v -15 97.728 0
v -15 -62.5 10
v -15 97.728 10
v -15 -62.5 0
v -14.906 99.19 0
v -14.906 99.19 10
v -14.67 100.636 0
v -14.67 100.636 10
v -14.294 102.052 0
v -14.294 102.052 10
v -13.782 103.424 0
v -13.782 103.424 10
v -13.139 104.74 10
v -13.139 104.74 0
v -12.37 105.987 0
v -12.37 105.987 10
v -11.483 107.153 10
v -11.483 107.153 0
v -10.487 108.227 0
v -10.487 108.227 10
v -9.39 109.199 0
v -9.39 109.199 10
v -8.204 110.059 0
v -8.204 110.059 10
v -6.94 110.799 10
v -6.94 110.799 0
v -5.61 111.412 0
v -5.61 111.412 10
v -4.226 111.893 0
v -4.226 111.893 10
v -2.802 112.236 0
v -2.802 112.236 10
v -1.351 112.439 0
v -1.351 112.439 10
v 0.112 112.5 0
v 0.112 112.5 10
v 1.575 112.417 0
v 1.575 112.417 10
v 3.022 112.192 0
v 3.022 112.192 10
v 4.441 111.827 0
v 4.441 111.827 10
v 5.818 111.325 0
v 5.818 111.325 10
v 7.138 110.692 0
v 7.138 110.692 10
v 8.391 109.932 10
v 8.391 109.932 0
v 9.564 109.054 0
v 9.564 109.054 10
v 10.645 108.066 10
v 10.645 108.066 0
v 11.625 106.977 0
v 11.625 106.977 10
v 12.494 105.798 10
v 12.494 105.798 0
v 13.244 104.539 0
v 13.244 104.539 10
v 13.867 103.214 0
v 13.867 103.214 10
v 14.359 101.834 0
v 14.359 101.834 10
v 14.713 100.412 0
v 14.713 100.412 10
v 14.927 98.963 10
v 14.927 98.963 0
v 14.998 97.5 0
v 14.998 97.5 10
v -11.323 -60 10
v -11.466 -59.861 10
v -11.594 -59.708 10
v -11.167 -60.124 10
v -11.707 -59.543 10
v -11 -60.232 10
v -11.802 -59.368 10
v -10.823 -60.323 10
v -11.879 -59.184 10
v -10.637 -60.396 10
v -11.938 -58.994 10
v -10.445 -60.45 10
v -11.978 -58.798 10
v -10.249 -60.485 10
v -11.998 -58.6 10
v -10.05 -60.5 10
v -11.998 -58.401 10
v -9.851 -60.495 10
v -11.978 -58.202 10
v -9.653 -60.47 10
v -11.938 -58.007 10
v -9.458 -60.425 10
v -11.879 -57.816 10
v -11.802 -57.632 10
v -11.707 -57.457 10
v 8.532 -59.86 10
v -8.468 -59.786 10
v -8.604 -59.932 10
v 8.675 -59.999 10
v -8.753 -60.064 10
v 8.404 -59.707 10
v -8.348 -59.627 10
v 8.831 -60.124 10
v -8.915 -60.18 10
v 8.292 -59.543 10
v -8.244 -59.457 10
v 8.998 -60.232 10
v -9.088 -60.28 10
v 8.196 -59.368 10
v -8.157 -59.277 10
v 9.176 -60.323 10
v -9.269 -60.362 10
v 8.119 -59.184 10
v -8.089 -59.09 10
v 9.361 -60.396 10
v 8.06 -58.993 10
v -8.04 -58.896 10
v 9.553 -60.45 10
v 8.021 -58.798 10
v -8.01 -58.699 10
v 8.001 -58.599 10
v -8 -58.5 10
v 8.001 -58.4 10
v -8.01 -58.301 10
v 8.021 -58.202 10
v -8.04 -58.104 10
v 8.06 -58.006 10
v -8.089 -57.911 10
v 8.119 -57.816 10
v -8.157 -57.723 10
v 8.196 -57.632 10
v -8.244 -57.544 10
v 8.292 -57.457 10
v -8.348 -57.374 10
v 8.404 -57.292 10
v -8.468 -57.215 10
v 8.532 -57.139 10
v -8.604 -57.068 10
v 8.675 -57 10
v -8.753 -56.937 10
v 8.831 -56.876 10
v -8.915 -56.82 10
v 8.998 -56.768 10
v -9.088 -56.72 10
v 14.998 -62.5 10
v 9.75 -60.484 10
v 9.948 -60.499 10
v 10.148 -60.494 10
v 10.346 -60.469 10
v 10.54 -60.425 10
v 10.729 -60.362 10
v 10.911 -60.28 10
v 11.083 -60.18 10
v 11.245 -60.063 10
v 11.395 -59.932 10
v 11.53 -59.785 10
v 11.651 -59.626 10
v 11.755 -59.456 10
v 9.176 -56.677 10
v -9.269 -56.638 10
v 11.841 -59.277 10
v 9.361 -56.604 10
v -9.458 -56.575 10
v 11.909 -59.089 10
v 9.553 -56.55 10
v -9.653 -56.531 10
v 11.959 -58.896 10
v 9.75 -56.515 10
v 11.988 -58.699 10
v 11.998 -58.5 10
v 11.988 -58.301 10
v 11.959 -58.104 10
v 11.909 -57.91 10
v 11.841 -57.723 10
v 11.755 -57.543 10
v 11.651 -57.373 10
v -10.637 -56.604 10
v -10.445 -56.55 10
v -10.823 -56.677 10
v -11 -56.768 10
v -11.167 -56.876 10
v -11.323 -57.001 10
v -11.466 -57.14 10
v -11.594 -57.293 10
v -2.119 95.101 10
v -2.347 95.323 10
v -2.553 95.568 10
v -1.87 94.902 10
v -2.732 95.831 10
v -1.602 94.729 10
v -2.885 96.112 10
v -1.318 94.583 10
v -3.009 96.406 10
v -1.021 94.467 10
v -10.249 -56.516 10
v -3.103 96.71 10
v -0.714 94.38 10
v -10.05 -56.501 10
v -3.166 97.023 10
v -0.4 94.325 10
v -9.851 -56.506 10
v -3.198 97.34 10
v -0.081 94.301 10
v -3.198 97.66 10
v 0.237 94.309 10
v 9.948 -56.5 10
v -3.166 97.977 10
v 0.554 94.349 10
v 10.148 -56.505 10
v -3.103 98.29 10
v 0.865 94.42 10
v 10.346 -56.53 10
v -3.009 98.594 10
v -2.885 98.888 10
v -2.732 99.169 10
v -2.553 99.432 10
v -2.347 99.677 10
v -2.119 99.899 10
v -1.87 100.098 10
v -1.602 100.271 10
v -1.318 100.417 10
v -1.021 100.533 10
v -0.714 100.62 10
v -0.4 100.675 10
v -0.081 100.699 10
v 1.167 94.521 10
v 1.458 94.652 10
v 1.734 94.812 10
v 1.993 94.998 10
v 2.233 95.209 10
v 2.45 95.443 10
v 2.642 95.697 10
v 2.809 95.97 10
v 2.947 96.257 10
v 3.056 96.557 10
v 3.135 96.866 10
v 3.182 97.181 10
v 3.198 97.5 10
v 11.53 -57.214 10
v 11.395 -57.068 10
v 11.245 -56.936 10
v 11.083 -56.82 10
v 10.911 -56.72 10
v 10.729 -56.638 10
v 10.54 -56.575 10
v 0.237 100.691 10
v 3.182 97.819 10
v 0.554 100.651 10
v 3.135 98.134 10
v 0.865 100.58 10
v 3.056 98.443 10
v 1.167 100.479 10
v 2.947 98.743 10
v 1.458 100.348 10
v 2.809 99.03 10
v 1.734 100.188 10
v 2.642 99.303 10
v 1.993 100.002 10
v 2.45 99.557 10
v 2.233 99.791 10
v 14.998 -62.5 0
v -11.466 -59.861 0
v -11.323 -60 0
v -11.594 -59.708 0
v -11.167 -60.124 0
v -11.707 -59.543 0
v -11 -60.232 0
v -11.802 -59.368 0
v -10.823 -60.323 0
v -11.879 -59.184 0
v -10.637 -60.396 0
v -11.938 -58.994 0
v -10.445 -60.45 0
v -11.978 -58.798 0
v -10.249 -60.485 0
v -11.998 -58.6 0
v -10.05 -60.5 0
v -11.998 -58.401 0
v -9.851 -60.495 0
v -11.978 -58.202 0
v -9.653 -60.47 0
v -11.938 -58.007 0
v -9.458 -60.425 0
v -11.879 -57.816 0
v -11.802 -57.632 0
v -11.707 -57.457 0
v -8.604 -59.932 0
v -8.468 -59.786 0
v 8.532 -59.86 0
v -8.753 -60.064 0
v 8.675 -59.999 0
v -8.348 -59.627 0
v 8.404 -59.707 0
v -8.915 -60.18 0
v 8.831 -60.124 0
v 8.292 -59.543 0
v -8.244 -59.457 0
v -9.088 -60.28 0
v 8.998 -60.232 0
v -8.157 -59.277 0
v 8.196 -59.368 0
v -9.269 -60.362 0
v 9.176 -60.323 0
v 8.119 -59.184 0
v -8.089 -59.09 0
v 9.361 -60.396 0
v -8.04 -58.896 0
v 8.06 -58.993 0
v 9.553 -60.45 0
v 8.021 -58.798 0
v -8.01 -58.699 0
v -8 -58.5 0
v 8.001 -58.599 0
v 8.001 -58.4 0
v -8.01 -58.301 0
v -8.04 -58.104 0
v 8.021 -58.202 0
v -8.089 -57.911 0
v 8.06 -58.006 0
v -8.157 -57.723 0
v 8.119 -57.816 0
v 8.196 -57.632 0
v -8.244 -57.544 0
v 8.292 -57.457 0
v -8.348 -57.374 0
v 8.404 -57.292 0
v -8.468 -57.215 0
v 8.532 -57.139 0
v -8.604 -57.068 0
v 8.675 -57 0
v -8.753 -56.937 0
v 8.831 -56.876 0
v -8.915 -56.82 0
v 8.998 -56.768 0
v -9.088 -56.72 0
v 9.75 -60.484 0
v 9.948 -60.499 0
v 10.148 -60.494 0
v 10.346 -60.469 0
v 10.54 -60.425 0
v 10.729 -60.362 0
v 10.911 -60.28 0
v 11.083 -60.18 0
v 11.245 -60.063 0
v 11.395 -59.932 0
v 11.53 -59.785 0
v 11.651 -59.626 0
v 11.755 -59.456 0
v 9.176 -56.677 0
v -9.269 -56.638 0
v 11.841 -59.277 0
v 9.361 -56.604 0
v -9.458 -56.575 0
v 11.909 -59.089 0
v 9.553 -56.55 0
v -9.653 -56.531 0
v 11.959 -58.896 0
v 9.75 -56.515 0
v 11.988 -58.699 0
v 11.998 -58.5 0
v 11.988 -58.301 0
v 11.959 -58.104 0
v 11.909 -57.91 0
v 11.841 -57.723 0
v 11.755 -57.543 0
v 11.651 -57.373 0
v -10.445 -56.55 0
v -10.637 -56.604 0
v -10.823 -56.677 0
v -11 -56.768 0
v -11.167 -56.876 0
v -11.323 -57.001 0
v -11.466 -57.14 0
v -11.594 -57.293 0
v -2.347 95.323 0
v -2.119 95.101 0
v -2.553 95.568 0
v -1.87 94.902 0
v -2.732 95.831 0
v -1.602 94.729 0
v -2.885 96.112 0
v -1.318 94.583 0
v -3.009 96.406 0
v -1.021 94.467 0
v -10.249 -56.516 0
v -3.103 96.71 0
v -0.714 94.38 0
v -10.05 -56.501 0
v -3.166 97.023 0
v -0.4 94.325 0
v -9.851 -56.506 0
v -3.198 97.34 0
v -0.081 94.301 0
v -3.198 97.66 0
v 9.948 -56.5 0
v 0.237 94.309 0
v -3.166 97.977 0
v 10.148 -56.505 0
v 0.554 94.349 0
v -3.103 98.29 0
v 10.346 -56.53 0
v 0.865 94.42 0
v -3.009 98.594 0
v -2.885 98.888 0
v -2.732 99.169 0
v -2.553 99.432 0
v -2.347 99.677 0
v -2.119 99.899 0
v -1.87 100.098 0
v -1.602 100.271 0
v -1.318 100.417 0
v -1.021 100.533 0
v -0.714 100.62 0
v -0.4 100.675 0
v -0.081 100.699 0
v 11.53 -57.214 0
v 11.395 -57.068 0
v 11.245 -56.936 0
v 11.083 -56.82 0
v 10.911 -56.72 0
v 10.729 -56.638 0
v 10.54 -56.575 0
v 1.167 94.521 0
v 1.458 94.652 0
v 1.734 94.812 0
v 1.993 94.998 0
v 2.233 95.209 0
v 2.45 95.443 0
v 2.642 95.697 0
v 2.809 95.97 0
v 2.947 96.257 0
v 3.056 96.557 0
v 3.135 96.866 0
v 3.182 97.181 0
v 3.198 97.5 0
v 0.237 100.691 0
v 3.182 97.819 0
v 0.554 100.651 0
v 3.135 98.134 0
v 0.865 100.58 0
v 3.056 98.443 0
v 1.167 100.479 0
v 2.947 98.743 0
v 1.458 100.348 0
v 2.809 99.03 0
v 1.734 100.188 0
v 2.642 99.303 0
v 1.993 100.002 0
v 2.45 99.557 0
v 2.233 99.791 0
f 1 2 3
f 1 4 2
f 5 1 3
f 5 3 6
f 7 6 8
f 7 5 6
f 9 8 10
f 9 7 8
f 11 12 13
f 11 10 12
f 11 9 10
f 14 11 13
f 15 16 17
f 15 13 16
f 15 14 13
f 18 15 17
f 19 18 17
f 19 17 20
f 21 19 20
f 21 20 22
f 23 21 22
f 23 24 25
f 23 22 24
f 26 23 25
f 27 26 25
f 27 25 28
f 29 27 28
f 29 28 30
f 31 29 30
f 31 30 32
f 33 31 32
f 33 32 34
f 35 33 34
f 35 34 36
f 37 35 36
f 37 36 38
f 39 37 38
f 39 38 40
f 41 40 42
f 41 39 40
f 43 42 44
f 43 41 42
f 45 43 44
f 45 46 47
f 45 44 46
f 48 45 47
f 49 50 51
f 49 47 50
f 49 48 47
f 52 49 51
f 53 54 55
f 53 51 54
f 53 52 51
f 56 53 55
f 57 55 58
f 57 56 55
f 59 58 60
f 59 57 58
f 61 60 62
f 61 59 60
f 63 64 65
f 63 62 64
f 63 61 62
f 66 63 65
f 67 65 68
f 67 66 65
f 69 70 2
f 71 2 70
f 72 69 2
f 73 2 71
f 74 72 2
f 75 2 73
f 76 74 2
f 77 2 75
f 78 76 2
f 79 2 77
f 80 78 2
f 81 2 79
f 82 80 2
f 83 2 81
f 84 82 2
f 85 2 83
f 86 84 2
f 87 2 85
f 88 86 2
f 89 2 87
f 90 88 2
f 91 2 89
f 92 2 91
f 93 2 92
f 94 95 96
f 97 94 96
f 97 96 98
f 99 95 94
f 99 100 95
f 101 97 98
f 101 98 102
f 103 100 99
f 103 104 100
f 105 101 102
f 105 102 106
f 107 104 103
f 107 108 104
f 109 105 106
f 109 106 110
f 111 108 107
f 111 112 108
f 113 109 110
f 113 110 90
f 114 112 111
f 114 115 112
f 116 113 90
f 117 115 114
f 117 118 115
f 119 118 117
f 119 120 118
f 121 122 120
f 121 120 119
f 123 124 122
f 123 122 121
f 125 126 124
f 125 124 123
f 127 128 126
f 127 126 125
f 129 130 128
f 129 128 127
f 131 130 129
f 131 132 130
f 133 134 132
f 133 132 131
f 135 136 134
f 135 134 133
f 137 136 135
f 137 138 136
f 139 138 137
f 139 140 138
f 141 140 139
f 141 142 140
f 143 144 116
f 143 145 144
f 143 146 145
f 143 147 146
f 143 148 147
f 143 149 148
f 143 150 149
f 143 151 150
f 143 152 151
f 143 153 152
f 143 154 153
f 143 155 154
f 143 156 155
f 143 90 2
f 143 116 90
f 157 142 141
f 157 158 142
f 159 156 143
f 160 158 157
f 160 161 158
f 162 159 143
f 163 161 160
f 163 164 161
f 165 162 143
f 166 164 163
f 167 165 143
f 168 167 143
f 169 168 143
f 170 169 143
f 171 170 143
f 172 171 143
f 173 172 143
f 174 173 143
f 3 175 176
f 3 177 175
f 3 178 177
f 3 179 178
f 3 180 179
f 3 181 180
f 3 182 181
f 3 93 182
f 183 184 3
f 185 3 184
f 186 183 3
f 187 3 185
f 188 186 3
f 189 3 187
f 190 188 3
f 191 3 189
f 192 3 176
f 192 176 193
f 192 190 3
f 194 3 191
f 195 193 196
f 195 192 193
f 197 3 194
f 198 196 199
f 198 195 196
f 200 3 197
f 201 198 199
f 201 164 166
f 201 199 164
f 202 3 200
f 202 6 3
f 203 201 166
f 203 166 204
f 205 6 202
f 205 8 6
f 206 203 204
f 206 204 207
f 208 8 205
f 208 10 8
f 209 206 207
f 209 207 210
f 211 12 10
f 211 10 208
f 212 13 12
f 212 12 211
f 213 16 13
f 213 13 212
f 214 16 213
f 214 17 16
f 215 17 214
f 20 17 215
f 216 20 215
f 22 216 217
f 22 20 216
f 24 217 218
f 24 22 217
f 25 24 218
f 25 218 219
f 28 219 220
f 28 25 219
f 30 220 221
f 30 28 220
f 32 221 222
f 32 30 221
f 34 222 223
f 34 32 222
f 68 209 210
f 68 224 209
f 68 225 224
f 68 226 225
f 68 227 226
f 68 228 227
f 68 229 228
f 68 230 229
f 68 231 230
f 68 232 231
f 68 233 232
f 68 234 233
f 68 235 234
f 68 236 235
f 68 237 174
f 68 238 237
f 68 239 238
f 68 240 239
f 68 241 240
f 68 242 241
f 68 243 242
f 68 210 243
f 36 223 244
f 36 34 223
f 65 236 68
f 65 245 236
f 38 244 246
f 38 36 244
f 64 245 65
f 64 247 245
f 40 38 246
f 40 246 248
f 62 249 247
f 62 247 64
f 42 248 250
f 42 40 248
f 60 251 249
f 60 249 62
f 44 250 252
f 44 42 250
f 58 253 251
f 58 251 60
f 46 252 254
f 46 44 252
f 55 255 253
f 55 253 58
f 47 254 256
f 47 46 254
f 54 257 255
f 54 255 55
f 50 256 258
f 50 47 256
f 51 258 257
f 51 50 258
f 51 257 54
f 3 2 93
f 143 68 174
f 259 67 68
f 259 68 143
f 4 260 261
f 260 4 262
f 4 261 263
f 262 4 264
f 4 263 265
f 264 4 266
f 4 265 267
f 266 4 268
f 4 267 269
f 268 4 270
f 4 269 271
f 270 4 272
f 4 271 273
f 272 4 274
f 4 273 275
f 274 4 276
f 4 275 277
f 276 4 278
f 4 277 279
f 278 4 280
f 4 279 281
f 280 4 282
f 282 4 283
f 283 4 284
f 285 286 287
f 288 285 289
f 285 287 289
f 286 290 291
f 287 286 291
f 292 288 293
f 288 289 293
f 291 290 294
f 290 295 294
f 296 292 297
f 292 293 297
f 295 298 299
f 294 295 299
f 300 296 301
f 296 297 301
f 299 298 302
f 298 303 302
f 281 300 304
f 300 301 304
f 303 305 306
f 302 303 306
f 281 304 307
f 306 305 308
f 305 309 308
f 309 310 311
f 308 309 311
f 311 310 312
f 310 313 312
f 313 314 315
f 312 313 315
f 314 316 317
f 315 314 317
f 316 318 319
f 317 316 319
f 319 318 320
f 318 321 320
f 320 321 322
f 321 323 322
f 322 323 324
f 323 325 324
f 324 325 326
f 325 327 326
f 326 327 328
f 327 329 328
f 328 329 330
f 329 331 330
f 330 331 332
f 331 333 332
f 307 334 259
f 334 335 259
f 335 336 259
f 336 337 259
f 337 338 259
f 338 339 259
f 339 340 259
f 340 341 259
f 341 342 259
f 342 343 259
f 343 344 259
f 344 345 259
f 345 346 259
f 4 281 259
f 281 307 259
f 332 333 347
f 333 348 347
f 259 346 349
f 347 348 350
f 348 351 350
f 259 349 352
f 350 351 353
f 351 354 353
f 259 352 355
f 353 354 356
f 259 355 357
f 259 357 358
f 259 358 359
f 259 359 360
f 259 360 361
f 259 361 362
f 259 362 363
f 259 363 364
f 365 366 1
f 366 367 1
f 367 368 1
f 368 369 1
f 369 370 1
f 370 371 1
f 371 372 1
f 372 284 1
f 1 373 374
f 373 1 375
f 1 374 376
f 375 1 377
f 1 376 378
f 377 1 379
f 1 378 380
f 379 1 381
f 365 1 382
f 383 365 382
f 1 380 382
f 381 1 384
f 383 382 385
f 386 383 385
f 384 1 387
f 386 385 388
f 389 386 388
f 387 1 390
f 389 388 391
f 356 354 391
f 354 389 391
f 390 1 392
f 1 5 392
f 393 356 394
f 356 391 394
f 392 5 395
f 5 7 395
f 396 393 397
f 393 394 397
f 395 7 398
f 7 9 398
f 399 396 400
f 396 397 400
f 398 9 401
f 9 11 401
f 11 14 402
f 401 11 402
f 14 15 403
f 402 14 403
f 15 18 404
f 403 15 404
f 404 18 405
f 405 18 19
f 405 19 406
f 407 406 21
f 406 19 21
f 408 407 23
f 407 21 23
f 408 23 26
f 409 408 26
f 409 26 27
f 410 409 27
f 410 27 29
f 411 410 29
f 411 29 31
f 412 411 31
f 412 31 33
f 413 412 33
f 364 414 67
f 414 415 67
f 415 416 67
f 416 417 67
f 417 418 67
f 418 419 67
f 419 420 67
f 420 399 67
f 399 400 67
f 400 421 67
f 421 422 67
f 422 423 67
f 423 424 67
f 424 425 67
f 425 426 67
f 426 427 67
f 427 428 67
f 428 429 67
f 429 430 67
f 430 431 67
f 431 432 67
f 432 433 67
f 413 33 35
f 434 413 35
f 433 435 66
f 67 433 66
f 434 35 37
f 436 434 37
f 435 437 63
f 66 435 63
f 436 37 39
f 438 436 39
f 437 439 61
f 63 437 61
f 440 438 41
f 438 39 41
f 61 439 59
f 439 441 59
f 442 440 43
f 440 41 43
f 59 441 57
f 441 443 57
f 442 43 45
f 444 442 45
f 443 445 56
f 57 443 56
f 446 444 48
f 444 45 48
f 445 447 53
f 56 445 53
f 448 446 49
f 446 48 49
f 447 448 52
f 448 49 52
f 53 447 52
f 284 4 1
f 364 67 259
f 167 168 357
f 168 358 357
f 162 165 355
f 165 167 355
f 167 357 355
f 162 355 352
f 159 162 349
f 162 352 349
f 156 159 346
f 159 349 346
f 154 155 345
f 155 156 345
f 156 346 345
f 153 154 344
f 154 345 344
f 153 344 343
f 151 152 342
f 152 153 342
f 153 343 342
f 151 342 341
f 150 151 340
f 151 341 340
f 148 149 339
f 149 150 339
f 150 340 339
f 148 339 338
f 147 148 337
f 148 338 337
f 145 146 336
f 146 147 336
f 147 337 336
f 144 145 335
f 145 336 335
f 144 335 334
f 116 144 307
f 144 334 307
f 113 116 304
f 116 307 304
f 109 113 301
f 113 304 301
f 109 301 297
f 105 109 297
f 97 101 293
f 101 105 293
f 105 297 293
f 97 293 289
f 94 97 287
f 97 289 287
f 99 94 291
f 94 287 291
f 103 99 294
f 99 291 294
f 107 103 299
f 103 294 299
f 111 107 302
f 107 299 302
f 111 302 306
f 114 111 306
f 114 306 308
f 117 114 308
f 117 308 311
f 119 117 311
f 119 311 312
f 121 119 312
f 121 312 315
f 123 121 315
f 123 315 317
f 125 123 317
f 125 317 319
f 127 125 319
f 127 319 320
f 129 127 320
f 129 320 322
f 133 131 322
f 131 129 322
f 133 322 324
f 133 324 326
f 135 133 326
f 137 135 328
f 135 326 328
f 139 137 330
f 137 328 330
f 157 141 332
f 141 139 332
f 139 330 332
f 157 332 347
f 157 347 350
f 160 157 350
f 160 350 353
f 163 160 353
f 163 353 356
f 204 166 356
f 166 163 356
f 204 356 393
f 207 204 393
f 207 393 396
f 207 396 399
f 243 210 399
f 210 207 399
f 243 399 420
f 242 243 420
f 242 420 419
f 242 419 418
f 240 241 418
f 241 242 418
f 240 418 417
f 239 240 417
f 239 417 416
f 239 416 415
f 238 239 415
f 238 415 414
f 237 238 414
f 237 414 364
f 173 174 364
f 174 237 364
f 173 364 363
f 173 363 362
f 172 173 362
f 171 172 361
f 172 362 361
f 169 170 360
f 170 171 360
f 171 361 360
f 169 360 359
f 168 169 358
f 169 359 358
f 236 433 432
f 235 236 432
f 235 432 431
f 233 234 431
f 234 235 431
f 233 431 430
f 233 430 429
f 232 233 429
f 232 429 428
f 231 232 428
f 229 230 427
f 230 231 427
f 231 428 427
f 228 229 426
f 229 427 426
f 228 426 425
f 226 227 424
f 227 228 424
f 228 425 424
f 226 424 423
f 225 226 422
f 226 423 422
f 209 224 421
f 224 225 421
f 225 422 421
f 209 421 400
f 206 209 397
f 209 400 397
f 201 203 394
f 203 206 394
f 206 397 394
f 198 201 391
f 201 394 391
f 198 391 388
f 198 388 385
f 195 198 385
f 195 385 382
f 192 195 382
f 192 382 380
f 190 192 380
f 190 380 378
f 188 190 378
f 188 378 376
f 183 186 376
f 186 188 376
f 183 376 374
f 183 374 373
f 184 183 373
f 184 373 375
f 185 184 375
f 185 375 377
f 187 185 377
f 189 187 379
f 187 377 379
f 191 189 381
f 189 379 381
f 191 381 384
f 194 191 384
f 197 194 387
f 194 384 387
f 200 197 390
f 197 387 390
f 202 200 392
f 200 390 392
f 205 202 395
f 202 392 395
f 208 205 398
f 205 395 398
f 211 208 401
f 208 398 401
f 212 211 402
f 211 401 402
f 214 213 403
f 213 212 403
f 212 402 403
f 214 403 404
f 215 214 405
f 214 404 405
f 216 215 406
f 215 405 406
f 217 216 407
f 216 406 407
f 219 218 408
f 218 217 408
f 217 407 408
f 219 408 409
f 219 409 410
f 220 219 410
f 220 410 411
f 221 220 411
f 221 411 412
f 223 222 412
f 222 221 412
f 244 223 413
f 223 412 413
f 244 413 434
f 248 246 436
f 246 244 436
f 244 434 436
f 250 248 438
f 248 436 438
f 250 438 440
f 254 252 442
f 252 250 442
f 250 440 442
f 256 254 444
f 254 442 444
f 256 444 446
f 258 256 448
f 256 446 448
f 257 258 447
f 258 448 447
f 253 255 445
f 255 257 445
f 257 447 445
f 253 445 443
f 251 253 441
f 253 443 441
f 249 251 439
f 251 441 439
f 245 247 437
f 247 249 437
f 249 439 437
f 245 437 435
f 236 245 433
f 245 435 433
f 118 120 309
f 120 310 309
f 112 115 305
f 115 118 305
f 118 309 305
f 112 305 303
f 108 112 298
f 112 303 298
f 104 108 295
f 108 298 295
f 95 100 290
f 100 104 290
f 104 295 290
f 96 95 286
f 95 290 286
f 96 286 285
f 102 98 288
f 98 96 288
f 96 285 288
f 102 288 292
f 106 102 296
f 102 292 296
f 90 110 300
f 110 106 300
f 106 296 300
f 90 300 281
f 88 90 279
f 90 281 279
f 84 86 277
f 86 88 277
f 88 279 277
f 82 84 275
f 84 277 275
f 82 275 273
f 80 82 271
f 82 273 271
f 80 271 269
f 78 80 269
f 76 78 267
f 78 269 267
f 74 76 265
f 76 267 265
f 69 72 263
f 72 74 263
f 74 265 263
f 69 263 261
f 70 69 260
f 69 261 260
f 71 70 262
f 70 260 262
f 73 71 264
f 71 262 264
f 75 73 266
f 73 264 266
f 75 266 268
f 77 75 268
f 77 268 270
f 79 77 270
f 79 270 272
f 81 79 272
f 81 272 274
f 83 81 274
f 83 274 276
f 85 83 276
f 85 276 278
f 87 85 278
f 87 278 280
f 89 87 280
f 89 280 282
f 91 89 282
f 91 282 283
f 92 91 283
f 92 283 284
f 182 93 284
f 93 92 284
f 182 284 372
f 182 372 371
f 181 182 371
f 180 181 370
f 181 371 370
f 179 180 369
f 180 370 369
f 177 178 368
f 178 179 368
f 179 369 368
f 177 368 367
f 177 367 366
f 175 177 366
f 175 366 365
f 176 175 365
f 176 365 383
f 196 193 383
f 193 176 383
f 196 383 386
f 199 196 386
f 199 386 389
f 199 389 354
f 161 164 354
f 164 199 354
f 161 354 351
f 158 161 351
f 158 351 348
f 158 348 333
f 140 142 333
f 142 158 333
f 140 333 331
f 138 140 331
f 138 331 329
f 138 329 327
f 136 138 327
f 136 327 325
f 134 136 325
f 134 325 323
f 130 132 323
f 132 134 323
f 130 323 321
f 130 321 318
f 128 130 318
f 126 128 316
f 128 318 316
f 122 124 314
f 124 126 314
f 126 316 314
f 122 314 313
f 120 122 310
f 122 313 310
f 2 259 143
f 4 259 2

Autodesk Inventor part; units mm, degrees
ref_plane "YZ Plane" through (0, 0, 0) normal (1, 0, 0) x (0, 1, 0)
ref_plane "XZ Plane" through (0, 0, 0) normal (0, 1, 0) x (-1, 0, 0)
ref_plane "XY Plane" through (0, 0, 0) normal (0, 0, 1) x (1, 0, 0)
sketch "Sketch1" plane through (0, 0, 0) normal (0, 0, 1) x (1, 0, 0)
  line L0 (14.9983, 97.5) -> (14.9983, -62.4997)
  line L1 (14.9983, -62.4997) -> (-15, -62.5003)
  line L2 (-15, -62.5003) -> (-15, 97.7282)
  circle A0 centre (-0.0017, 97.5) radius 3.2
  circle A1 centre (9.9983, -58.4998) radius 2
  circle A2 centre (-10, -58.5002) radius 2
  arc A3 (14.9983, 97.5) -> (-15, 97.7282) centre (-0.0017, 97.5) ccw
  point P0 (0, 0)
  point P1 (-4.1636, 111.9111)
  point P2 (4.161, 111.9108)
  dimension "d2" = 62.5
  dimension "d3" = 15
  dimension "d4" = 6.4
  dimension "d5" = 15
  dimension "d7" = 4
  dimension "d8" = 4
  dimension "d9" = 5
  dimension "d10" = 4
  dimension "d11" = 4
  dimension "d12" = 5
  dimension "d17" = 160
extrude "Extrusion1" add sketch "Sketch1" along normal blind 10
equation "\"d2\" = 0.5 * d0"
equation "\"d3\" = 0.5 * d1"
equation "\"d5\" = 0.5 * d1"
equation "\"d11\" = d10"
equation "\"d12\" = d9"
equation "\"d1\" = 30"
equation "\"d0\" = 125"
properties part number "spool arm support"
